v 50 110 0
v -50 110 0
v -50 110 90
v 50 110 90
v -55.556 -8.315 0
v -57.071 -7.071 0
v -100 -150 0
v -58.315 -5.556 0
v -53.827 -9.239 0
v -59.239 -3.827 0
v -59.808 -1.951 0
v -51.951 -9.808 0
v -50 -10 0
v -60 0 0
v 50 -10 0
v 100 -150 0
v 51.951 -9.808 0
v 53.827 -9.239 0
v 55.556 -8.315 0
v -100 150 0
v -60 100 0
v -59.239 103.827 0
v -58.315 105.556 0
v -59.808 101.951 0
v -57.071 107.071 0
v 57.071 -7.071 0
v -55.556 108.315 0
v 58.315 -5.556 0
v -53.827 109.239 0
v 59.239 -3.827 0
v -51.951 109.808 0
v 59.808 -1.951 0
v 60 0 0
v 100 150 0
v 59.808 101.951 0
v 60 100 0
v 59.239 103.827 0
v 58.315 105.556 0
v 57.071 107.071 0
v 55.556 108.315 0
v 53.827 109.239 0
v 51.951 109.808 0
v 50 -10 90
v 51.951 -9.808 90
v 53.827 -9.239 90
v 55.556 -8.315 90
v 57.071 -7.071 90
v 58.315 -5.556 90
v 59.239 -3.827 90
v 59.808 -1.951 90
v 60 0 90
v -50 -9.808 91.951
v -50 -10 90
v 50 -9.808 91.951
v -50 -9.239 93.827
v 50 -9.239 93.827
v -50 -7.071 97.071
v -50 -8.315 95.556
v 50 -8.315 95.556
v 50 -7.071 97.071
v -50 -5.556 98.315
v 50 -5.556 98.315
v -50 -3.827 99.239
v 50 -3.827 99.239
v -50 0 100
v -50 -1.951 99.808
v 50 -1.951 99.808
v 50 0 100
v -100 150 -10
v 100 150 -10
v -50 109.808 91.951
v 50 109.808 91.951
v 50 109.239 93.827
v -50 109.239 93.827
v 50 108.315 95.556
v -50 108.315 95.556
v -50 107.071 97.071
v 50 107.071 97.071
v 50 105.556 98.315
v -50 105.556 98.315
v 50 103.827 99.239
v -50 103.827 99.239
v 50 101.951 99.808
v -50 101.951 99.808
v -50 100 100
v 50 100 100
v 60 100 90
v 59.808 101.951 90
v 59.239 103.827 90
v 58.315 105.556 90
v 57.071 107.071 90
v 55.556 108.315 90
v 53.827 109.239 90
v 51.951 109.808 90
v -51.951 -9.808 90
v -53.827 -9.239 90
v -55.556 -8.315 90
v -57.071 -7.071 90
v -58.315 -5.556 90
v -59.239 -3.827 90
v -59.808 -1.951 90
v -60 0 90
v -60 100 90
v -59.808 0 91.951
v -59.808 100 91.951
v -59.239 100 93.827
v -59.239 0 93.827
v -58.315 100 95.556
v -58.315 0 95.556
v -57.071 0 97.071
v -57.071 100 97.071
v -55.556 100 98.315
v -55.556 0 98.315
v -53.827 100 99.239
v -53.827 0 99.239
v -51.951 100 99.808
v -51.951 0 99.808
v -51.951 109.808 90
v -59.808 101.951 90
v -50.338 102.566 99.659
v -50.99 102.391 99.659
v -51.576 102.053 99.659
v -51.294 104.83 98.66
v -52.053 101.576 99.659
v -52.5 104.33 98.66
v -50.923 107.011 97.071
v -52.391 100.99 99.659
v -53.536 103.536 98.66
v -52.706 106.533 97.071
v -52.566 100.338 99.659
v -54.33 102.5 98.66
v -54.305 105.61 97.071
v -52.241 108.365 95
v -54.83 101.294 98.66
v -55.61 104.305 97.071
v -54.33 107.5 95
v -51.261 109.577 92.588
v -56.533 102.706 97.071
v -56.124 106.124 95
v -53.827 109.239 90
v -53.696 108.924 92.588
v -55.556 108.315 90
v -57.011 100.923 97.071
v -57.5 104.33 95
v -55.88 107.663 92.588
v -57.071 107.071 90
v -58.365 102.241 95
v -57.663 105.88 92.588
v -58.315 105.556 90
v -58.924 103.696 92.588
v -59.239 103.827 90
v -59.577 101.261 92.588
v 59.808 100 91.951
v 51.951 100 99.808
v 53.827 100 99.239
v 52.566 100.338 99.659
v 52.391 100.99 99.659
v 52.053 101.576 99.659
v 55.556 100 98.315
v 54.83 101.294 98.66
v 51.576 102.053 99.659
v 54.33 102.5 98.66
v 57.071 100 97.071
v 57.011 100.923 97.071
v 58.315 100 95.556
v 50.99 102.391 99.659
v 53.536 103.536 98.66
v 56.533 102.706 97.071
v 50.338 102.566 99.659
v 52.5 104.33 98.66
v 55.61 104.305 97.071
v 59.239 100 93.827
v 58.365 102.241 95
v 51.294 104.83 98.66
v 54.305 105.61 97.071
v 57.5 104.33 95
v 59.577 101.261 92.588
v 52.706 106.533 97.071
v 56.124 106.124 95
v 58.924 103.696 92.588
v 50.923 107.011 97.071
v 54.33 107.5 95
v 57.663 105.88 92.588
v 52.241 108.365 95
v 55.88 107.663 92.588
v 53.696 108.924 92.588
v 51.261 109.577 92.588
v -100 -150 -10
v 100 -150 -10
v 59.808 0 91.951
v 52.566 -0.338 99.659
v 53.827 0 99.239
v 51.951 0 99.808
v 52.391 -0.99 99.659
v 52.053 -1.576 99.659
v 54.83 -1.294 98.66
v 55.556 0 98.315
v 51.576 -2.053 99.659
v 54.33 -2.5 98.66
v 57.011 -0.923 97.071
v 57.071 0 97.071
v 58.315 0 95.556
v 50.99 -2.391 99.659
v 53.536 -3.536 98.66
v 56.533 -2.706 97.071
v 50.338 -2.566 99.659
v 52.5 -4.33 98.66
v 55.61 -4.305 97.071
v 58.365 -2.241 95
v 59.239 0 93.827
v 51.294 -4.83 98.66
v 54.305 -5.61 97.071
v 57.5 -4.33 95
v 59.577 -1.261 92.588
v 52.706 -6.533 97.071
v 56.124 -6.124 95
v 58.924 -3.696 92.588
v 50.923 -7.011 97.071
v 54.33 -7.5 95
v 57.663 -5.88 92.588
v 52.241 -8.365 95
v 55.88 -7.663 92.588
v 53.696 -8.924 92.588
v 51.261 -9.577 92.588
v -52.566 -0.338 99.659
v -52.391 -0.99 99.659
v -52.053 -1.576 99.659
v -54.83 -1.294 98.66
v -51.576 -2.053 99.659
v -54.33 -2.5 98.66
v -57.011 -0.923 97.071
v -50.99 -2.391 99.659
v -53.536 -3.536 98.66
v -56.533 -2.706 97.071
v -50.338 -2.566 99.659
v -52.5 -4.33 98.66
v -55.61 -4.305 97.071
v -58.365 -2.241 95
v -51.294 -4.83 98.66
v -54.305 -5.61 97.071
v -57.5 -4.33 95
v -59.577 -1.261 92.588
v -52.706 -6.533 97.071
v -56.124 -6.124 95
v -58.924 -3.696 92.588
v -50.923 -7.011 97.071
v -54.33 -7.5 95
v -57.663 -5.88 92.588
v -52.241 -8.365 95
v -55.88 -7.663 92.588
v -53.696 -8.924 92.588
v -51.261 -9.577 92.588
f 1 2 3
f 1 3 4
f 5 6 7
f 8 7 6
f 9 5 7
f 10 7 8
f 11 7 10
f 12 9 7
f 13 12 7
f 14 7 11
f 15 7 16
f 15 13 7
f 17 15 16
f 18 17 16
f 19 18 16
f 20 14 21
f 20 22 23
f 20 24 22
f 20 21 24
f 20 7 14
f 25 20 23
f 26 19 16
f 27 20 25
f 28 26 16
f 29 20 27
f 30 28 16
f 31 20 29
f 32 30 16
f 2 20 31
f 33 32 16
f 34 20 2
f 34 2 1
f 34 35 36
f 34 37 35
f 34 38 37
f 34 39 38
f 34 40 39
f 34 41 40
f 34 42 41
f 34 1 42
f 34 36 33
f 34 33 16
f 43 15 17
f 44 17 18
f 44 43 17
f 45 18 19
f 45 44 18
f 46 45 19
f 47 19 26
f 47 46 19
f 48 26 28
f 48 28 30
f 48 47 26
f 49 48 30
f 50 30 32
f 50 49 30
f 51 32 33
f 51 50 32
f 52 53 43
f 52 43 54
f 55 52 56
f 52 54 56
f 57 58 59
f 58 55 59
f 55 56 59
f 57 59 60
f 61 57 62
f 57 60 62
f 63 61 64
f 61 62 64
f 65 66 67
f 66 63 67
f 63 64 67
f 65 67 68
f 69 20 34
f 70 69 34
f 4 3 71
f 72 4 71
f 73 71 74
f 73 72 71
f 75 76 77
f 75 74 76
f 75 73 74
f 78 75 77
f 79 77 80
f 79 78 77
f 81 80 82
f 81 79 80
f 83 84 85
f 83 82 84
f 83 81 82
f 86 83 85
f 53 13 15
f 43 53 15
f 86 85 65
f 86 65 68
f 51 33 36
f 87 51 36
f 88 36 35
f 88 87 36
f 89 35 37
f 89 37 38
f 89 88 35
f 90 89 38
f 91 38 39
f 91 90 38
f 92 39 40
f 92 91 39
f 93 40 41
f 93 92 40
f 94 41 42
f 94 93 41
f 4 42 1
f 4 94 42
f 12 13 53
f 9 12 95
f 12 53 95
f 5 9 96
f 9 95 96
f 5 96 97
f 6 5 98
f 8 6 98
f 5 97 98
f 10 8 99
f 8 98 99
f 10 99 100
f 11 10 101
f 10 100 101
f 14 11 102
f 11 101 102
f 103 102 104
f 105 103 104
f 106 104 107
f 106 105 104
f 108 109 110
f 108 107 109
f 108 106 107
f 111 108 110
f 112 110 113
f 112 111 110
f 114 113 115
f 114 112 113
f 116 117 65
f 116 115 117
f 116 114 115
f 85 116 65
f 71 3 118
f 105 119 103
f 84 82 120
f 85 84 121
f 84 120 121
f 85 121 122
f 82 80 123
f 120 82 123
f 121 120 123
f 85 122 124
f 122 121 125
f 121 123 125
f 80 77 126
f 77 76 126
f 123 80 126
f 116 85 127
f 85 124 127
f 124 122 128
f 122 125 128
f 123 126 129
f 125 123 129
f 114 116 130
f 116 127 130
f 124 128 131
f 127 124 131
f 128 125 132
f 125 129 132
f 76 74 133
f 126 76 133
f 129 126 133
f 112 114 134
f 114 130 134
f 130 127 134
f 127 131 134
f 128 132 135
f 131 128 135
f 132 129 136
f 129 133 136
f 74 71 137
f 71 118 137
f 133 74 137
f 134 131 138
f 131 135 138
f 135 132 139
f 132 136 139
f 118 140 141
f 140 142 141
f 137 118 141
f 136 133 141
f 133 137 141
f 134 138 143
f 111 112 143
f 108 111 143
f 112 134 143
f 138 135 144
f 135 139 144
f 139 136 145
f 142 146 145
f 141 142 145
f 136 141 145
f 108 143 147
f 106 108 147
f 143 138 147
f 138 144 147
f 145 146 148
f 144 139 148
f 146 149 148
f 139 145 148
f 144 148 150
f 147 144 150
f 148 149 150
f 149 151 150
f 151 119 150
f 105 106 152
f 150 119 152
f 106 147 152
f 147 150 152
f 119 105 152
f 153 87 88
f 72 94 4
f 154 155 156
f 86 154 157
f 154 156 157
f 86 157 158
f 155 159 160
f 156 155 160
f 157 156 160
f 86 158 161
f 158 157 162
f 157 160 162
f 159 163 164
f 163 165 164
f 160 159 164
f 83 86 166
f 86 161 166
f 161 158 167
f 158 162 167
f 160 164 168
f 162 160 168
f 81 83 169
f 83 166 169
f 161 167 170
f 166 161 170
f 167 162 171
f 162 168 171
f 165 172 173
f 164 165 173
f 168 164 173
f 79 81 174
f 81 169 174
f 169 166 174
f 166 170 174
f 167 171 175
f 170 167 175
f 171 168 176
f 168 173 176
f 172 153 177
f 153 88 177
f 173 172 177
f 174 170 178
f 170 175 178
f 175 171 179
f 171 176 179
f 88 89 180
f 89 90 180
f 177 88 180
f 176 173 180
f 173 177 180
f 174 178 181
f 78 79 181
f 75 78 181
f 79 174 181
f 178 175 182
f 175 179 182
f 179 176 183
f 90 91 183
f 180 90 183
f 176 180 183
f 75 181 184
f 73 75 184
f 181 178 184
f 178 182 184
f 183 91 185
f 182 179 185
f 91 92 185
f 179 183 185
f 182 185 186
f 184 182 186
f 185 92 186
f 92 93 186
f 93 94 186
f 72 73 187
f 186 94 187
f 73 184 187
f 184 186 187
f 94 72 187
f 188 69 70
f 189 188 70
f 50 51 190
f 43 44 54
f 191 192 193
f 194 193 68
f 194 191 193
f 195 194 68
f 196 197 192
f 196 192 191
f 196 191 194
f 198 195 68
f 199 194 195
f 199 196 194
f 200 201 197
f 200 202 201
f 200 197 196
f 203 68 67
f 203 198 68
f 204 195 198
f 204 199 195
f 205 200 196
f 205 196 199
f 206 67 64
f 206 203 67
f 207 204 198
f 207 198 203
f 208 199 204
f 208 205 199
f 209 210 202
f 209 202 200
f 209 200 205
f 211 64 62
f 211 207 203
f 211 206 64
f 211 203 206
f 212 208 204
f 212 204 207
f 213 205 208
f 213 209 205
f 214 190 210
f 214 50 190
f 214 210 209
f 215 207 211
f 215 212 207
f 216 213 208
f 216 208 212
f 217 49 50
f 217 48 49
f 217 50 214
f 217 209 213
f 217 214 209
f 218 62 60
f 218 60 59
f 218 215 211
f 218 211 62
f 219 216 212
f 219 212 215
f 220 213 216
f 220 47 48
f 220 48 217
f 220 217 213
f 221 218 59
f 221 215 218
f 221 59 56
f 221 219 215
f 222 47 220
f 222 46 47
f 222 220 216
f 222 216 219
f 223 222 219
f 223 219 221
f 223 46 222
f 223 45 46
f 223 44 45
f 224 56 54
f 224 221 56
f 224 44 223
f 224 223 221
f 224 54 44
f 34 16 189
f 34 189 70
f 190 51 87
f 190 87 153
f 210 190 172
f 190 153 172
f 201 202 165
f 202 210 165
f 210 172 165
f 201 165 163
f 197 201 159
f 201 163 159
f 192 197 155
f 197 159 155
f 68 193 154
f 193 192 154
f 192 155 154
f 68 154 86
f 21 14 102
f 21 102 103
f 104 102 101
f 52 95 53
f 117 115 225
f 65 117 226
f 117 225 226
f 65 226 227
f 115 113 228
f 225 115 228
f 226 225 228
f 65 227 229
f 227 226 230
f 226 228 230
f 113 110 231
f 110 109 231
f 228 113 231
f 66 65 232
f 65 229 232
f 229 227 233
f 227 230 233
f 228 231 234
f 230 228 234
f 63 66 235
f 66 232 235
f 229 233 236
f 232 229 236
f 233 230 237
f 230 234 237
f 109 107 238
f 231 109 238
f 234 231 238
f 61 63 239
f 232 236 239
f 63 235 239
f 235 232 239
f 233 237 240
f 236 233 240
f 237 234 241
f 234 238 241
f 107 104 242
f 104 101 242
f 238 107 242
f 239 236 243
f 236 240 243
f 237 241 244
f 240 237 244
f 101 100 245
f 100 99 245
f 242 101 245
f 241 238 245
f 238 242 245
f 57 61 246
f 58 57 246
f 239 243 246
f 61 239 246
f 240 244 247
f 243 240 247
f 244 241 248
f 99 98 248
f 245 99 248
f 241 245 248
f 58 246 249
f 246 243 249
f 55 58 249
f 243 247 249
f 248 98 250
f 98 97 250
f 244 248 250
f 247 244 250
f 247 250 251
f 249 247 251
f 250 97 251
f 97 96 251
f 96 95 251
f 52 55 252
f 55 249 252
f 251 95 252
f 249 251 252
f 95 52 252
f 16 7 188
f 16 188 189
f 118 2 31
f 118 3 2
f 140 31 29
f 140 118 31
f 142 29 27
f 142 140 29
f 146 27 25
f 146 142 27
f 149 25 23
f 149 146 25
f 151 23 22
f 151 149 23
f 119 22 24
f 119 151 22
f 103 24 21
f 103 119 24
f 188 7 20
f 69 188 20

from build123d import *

# Parameters (mm, degrees)
SKETCH_1_W      = 200
SKETCH_1_H      = 300
EXTRUDE_1_DEPTH = 10
SKETCH_2_W      = 120
SKETCH_2_H      = 120
EXTRUDE_2_DEPTH = 100
FILLET_1_R      = 10


with BuildPart() as part:
    # 草图1 → 凸台-拉伸1 (new body)
    with BuildSketch(Plane.XY):
        Rectangle(SKETCH_1_W, SKETCH_1_H)
    extrude(amount=-EXTRUDE_1_DEPTH)

    # 草图2 → 凸台-拉伸2 (add)
    with BuildSketch(Plane.XY):
        with Locations((0, 50)):
            Rectangle(SKETCH_2_W, SKETCH_2_H)
    extrude(amount=EXTRUDE_2_DEPTH)

    # 圆角1
    fillet_1_edges = [part.edges().sort_by_distance(p)[0] for p in [
        (60, -10, 50),
        (60, 110, 50),
        (-60, 110, 50),
        (-60, -10, 50),
        (60, 50, 100),
        (0, 110, 100),
        (-60, 50, 100),
        (0, -10, 100),
    ]]
    fillet(fillet_1_edges, radius=FILLET_1_R)


solid = part.part
